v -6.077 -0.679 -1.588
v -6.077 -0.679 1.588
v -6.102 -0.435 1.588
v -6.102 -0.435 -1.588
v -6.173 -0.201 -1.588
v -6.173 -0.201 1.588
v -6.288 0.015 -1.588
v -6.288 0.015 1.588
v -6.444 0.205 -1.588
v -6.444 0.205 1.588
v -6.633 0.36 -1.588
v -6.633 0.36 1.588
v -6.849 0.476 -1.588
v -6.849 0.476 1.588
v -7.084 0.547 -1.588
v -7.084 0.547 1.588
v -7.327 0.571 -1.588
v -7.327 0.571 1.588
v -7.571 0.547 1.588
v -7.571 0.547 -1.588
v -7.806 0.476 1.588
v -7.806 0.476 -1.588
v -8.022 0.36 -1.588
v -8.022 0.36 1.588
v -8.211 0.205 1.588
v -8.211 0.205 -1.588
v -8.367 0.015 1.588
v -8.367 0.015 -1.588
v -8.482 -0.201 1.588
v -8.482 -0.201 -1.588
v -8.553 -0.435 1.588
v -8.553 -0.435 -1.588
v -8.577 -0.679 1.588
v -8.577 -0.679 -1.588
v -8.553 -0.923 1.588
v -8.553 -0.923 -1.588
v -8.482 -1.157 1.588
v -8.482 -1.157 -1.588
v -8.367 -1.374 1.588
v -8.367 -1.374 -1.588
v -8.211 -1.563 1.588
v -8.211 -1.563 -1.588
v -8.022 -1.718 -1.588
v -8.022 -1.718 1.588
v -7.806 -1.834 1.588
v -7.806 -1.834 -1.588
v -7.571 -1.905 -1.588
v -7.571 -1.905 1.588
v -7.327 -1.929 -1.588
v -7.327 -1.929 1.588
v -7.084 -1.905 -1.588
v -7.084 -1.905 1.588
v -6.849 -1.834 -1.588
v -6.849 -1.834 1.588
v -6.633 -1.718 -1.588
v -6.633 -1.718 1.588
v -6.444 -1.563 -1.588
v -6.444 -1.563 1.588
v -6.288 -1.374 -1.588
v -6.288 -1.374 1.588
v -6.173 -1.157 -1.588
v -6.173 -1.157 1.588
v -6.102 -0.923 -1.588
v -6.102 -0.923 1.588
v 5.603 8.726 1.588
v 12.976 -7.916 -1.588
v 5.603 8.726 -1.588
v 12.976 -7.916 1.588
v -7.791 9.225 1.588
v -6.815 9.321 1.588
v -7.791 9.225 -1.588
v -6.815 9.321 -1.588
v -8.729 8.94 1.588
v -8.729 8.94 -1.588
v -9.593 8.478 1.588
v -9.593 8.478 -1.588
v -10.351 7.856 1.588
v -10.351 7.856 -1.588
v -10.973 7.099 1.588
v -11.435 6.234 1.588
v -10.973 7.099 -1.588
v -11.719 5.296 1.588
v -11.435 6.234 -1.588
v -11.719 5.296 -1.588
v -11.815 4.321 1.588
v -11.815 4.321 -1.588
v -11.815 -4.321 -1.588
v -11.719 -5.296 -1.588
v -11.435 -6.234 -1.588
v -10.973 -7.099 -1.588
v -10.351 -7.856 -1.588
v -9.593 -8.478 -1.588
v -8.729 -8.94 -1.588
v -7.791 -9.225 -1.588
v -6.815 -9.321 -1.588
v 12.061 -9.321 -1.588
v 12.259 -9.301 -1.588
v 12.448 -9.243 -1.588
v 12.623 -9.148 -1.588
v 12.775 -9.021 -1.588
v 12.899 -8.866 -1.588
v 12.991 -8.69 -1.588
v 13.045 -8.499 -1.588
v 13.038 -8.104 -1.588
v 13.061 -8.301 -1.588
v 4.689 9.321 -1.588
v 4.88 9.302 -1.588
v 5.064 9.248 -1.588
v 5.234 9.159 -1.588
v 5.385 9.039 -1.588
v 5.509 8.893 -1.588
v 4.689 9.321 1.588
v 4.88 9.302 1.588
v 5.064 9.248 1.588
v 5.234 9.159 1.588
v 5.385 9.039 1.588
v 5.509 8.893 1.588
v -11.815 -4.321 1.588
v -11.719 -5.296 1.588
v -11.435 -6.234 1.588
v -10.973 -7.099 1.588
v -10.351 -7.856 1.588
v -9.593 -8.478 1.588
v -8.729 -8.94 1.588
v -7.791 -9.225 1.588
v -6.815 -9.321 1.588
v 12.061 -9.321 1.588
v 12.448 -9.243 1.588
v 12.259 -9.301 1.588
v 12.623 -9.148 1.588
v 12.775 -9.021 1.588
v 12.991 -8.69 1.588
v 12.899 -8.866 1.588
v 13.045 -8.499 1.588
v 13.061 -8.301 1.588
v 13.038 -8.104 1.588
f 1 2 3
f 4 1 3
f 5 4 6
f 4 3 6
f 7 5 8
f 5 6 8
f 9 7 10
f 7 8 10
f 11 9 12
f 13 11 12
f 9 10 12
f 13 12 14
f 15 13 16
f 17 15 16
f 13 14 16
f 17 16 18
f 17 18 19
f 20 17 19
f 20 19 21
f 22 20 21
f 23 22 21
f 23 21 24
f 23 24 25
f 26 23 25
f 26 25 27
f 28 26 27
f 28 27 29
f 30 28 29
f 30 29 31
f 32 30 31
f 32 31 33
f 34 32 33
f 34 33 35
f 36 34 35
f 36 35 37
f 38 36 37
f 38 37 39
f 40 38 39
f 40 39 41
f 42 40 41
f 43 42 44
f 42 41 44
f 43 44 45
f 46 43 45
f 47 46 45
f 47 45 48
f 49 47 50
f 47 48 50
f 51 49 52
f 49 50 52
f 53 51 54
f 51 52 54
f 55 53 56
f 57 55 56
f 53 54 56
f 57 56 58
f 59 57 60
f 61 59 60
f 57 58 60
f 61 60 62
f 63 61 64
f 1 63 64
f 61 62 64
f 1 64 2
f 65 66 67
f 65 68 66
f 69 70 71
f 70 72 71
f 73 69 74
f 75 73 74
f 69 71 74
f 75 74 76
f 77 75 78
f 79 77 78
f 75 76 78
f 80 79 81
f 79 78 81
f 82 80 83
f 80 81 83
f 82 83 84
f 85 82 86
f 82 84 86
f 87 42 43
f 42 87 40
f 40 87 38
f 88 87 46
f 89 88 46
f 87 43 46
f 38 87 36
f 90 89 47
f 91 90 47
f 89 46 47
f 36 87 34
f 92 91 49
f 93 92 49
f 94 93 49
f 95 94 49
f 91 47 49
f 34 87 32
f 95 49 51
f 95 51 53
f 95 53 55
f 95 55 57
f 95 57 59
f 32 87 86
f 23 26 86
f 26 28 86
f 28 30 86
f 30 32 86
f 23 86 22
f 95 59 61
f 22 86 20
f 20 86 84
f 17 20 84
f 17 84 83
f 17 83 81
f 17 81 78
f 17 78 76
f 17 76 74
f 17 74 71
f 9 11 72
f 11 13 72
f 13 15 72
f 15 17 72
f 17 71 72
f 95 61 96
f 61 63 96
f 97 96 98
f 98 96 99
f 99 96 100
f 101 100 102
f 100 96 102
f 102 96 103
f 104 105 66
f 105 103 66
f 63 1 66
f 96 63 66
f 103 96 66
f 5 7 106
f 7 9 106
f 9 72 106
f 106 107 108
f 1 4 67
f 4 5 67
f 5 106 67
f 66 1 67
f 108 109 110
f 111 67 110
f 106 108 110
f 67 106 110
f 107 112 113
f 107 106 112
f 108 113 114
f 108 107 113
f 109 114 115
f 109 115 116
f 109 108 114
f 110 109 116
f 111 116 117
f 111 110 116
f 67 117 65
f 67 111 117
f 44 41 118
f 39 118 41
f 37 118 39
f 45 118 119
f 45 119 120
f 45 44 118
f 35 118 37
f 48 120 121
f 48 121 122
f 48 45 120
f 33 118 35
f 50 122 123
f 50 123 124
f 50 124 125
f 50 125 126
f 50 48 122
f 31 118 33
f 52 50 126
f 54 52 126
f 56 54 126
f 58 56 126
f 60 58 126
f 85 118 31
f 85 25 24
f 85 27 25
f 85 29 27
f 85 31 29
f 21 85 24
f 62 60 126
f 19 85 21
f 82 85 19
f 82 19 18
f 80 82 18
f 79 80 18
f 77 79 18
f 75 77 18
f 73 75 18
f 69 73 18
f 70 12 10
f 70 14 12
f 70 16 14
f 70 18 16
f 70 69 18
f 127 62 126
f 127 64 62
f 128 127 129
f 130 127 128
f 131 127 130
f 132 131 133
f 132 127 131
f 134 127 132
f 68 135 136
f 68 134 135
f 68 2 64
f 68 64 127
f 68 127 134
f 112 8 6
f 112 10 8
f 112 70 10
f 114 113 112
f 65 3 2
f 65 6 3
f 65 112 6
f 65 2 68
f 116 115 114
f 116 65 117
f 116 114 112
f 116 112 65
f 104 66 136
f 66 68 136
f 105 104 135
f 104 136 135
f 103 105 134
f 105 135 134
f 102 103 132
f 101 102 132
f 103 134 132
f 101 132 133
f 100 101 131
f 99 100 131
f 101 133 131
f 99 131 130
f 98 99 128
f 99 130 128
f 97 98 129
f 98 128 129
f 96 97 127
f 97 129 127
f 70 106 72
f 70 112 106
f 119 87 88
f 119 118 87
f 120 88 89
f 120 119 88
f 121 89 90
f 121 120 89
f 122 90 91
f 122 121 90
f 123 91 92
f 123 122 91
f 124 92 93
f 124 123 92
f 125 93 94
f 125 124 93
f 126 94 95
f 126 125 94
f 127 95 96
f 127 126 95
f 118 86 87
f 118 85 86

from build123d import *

# Parameters (mm, degrees)
BOSS_EXTRUDE1_DEPTH = 1.5875
FILLET1_R           = 1
FILLET2_R           = 5
SKETCH2_R           = 1.25
CUT_EXTRUDE1_DEPTH  = 17.357137005


with BuildPart() as part:
    # Sketch1 → Boss-Extrude1 (new, symmetric)
    with BuildSketch(Plane.XY):
        Polygon((-11.81540086, 9.32089354), (-11.81540086, -9.32089354), (12.941517766, -9.32089354), (13.597976447, -9.32089354), (5.339733299, 9.32089354), (4.683274618, 9.32089354), align=None)
    extrude(amount=BOSS_EXTRUDE1_DEPTH, both=True)

    # Fillet1
    fillet1_edges = [part.edges().sort_by_distance(p)[0] for p in [
        (5.339733299, 9.32089354, 0),
        (13.597976447, -9.32089354, 0),
    ]]
    fillet(fillet1_edges, radius=FILLET1_R)

    # Fillet2
    fillet2_edges = [part.edges().sort_by_distance(p)[0] for p in [
        (-11.81540086, -9.32089354, 0),
        (-11.81540086, 9.32089354, 0),
    ]]
    fillet(fillet2_edges, radius=FILLET2_R)

    # Sketch2 → Cut-Extrude1 (cut, through all)
    with BuildSketch(Plane.XY.offset(1.5875)):
        with Locations((-7.3274835, -0.67910646)):
            Circle(SKETCH2_R)
    extrude(amount=-CUT_EXTRUDE1_DEPTH, mode=Mode.SUBTRACT)


solid = part.part
